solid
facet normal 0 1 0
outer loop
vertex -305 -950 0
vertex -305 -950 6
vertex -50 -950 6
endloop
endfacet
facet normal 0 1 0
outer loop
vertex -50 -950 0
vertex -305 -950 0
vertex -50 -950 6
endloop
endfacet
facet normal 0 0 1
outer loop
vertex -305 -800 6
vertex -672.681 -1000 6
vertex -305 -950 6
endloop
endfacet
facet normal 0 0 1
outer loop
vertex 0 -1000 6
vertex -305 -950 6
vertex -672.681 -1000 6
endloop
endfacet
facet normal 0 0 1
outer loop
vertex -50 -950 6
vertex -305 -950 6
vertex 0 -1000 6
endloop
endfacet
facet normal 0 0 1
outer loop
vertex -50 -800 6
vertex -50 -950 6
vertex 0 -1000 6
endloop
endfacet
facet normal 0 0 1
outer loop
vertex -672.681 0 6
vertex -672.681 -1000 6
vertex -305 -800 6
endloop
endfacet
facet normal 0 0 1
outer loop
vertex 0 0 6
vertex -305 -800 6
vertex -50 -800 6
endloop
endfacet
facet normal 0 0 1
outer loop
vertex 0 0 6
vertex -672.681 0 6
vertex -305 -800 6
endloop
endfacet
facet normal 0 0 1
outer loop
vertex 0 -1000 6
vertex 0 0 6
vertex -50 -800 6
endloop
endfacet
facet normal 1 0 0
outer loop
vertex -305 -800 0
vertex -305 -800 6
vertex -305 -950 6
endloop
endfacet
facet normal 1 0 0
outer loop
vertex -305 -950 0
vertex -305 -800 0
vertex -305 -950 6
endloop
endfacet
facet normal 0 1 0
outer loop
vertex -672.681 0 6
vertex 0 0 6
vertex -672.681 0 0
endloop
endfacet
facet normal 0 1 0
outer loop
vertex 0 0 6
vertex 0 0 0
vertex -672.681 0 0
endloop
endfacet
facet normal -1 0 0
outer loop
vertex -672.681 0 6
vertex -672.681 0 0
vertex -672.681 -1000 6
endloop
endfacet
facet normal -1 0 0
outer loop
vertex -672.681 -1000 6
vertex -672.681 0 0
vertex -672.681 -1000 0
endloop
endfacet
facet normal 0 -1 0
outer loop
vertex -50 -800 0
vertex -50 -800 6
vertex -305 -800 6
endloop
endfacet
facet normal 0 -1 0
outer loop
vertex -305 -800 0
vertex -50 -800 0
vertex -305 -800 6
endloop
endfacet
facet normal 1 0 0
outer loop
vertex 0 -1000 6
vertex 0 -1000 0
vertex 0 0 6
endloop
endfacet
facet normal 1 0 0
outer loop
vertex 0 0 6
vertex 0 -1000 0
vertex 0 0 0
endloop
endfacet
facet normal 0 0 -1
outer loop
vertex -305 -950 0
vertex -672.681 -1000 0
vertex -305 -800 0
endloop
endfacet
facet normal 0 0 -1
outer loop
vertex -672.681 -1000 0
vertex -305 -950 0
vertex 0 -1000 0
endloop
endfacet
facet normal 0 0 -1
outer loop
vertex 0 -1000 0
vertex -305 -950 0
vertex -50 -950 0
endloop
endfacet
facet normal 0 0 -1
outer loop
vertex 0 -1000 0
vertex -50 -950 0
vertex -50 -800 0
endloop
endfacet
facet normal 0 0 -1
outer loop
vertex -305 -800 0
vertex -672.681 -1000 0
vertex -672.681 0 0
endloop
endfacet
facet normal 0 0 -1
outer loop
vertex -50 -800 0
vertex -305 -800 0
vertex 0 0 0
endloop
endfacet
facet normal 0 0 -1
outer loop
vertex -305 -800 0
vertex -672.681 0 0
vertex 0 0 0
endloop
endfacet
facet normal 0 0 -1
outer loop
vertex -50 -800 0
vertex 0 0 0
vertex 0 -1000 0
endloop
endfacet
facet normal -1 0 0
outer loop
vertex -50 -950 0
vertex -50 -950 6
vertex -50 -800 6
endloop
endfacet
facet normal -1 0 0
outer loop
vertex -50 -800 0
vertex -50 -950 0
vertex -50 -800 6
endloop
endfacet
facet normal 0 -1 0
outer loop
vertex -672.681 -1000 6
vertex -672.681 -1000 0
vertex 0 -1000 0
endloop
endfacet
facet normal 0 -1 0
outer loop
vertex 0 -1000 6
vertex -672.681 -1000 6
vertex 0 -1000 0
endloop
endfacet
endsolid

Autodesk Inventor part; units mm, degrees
ref_plane "YZ Plane" through (0, 0, 0) normal (1, 0, 0) x (0, 1, 0)
ref_plane "XZ Plane" through (0, 0, 0) normal (0, 1, 0) x (-1, 0, 0)
ref_plane "XY Plane" through (0, 0, 0) normal (0, 0, 1) x (1, 0, 0)
sketch "Sketch1" plane through (0, 0, 0) normal (0, 0, 1) x (1, 0, 0)
  line L0 (0, 0) -> (-672.6812, 0)
  line L1 (-672.6812, 0) -> (-672.6812, -1000)
  line L2 (-672.6812, -1000) -> (0, -1000)
  line L3 (0, -1000) -> (0, 0)
extrude "Extrusion1" add sketch "Sketch1" along normal blind 6
sketch "Sketch2" plane through (0, 0, 6) normal (0, 0, 1) x (1, 0, 0)
  line L0 (-50, -800) -> (-305, -800)
  line L1 (-305, -800) -> (-305, -950)
  line L2 (-305, -950) -> (-50, -950)
  line L3 (-50, -950) -> (-50, -800)
  line L4 (-672.6812, -1000) -> (0, -1000) projected
  point P0 (0, 0)
  dimension "d2" = 150
  dimension "d3" = 255
  dimension "d4" = 50
  dimension "d5" = 50
extrude "Extrusion2" cut sketch "Sketch2" against normal through all
properties part number "capot"
